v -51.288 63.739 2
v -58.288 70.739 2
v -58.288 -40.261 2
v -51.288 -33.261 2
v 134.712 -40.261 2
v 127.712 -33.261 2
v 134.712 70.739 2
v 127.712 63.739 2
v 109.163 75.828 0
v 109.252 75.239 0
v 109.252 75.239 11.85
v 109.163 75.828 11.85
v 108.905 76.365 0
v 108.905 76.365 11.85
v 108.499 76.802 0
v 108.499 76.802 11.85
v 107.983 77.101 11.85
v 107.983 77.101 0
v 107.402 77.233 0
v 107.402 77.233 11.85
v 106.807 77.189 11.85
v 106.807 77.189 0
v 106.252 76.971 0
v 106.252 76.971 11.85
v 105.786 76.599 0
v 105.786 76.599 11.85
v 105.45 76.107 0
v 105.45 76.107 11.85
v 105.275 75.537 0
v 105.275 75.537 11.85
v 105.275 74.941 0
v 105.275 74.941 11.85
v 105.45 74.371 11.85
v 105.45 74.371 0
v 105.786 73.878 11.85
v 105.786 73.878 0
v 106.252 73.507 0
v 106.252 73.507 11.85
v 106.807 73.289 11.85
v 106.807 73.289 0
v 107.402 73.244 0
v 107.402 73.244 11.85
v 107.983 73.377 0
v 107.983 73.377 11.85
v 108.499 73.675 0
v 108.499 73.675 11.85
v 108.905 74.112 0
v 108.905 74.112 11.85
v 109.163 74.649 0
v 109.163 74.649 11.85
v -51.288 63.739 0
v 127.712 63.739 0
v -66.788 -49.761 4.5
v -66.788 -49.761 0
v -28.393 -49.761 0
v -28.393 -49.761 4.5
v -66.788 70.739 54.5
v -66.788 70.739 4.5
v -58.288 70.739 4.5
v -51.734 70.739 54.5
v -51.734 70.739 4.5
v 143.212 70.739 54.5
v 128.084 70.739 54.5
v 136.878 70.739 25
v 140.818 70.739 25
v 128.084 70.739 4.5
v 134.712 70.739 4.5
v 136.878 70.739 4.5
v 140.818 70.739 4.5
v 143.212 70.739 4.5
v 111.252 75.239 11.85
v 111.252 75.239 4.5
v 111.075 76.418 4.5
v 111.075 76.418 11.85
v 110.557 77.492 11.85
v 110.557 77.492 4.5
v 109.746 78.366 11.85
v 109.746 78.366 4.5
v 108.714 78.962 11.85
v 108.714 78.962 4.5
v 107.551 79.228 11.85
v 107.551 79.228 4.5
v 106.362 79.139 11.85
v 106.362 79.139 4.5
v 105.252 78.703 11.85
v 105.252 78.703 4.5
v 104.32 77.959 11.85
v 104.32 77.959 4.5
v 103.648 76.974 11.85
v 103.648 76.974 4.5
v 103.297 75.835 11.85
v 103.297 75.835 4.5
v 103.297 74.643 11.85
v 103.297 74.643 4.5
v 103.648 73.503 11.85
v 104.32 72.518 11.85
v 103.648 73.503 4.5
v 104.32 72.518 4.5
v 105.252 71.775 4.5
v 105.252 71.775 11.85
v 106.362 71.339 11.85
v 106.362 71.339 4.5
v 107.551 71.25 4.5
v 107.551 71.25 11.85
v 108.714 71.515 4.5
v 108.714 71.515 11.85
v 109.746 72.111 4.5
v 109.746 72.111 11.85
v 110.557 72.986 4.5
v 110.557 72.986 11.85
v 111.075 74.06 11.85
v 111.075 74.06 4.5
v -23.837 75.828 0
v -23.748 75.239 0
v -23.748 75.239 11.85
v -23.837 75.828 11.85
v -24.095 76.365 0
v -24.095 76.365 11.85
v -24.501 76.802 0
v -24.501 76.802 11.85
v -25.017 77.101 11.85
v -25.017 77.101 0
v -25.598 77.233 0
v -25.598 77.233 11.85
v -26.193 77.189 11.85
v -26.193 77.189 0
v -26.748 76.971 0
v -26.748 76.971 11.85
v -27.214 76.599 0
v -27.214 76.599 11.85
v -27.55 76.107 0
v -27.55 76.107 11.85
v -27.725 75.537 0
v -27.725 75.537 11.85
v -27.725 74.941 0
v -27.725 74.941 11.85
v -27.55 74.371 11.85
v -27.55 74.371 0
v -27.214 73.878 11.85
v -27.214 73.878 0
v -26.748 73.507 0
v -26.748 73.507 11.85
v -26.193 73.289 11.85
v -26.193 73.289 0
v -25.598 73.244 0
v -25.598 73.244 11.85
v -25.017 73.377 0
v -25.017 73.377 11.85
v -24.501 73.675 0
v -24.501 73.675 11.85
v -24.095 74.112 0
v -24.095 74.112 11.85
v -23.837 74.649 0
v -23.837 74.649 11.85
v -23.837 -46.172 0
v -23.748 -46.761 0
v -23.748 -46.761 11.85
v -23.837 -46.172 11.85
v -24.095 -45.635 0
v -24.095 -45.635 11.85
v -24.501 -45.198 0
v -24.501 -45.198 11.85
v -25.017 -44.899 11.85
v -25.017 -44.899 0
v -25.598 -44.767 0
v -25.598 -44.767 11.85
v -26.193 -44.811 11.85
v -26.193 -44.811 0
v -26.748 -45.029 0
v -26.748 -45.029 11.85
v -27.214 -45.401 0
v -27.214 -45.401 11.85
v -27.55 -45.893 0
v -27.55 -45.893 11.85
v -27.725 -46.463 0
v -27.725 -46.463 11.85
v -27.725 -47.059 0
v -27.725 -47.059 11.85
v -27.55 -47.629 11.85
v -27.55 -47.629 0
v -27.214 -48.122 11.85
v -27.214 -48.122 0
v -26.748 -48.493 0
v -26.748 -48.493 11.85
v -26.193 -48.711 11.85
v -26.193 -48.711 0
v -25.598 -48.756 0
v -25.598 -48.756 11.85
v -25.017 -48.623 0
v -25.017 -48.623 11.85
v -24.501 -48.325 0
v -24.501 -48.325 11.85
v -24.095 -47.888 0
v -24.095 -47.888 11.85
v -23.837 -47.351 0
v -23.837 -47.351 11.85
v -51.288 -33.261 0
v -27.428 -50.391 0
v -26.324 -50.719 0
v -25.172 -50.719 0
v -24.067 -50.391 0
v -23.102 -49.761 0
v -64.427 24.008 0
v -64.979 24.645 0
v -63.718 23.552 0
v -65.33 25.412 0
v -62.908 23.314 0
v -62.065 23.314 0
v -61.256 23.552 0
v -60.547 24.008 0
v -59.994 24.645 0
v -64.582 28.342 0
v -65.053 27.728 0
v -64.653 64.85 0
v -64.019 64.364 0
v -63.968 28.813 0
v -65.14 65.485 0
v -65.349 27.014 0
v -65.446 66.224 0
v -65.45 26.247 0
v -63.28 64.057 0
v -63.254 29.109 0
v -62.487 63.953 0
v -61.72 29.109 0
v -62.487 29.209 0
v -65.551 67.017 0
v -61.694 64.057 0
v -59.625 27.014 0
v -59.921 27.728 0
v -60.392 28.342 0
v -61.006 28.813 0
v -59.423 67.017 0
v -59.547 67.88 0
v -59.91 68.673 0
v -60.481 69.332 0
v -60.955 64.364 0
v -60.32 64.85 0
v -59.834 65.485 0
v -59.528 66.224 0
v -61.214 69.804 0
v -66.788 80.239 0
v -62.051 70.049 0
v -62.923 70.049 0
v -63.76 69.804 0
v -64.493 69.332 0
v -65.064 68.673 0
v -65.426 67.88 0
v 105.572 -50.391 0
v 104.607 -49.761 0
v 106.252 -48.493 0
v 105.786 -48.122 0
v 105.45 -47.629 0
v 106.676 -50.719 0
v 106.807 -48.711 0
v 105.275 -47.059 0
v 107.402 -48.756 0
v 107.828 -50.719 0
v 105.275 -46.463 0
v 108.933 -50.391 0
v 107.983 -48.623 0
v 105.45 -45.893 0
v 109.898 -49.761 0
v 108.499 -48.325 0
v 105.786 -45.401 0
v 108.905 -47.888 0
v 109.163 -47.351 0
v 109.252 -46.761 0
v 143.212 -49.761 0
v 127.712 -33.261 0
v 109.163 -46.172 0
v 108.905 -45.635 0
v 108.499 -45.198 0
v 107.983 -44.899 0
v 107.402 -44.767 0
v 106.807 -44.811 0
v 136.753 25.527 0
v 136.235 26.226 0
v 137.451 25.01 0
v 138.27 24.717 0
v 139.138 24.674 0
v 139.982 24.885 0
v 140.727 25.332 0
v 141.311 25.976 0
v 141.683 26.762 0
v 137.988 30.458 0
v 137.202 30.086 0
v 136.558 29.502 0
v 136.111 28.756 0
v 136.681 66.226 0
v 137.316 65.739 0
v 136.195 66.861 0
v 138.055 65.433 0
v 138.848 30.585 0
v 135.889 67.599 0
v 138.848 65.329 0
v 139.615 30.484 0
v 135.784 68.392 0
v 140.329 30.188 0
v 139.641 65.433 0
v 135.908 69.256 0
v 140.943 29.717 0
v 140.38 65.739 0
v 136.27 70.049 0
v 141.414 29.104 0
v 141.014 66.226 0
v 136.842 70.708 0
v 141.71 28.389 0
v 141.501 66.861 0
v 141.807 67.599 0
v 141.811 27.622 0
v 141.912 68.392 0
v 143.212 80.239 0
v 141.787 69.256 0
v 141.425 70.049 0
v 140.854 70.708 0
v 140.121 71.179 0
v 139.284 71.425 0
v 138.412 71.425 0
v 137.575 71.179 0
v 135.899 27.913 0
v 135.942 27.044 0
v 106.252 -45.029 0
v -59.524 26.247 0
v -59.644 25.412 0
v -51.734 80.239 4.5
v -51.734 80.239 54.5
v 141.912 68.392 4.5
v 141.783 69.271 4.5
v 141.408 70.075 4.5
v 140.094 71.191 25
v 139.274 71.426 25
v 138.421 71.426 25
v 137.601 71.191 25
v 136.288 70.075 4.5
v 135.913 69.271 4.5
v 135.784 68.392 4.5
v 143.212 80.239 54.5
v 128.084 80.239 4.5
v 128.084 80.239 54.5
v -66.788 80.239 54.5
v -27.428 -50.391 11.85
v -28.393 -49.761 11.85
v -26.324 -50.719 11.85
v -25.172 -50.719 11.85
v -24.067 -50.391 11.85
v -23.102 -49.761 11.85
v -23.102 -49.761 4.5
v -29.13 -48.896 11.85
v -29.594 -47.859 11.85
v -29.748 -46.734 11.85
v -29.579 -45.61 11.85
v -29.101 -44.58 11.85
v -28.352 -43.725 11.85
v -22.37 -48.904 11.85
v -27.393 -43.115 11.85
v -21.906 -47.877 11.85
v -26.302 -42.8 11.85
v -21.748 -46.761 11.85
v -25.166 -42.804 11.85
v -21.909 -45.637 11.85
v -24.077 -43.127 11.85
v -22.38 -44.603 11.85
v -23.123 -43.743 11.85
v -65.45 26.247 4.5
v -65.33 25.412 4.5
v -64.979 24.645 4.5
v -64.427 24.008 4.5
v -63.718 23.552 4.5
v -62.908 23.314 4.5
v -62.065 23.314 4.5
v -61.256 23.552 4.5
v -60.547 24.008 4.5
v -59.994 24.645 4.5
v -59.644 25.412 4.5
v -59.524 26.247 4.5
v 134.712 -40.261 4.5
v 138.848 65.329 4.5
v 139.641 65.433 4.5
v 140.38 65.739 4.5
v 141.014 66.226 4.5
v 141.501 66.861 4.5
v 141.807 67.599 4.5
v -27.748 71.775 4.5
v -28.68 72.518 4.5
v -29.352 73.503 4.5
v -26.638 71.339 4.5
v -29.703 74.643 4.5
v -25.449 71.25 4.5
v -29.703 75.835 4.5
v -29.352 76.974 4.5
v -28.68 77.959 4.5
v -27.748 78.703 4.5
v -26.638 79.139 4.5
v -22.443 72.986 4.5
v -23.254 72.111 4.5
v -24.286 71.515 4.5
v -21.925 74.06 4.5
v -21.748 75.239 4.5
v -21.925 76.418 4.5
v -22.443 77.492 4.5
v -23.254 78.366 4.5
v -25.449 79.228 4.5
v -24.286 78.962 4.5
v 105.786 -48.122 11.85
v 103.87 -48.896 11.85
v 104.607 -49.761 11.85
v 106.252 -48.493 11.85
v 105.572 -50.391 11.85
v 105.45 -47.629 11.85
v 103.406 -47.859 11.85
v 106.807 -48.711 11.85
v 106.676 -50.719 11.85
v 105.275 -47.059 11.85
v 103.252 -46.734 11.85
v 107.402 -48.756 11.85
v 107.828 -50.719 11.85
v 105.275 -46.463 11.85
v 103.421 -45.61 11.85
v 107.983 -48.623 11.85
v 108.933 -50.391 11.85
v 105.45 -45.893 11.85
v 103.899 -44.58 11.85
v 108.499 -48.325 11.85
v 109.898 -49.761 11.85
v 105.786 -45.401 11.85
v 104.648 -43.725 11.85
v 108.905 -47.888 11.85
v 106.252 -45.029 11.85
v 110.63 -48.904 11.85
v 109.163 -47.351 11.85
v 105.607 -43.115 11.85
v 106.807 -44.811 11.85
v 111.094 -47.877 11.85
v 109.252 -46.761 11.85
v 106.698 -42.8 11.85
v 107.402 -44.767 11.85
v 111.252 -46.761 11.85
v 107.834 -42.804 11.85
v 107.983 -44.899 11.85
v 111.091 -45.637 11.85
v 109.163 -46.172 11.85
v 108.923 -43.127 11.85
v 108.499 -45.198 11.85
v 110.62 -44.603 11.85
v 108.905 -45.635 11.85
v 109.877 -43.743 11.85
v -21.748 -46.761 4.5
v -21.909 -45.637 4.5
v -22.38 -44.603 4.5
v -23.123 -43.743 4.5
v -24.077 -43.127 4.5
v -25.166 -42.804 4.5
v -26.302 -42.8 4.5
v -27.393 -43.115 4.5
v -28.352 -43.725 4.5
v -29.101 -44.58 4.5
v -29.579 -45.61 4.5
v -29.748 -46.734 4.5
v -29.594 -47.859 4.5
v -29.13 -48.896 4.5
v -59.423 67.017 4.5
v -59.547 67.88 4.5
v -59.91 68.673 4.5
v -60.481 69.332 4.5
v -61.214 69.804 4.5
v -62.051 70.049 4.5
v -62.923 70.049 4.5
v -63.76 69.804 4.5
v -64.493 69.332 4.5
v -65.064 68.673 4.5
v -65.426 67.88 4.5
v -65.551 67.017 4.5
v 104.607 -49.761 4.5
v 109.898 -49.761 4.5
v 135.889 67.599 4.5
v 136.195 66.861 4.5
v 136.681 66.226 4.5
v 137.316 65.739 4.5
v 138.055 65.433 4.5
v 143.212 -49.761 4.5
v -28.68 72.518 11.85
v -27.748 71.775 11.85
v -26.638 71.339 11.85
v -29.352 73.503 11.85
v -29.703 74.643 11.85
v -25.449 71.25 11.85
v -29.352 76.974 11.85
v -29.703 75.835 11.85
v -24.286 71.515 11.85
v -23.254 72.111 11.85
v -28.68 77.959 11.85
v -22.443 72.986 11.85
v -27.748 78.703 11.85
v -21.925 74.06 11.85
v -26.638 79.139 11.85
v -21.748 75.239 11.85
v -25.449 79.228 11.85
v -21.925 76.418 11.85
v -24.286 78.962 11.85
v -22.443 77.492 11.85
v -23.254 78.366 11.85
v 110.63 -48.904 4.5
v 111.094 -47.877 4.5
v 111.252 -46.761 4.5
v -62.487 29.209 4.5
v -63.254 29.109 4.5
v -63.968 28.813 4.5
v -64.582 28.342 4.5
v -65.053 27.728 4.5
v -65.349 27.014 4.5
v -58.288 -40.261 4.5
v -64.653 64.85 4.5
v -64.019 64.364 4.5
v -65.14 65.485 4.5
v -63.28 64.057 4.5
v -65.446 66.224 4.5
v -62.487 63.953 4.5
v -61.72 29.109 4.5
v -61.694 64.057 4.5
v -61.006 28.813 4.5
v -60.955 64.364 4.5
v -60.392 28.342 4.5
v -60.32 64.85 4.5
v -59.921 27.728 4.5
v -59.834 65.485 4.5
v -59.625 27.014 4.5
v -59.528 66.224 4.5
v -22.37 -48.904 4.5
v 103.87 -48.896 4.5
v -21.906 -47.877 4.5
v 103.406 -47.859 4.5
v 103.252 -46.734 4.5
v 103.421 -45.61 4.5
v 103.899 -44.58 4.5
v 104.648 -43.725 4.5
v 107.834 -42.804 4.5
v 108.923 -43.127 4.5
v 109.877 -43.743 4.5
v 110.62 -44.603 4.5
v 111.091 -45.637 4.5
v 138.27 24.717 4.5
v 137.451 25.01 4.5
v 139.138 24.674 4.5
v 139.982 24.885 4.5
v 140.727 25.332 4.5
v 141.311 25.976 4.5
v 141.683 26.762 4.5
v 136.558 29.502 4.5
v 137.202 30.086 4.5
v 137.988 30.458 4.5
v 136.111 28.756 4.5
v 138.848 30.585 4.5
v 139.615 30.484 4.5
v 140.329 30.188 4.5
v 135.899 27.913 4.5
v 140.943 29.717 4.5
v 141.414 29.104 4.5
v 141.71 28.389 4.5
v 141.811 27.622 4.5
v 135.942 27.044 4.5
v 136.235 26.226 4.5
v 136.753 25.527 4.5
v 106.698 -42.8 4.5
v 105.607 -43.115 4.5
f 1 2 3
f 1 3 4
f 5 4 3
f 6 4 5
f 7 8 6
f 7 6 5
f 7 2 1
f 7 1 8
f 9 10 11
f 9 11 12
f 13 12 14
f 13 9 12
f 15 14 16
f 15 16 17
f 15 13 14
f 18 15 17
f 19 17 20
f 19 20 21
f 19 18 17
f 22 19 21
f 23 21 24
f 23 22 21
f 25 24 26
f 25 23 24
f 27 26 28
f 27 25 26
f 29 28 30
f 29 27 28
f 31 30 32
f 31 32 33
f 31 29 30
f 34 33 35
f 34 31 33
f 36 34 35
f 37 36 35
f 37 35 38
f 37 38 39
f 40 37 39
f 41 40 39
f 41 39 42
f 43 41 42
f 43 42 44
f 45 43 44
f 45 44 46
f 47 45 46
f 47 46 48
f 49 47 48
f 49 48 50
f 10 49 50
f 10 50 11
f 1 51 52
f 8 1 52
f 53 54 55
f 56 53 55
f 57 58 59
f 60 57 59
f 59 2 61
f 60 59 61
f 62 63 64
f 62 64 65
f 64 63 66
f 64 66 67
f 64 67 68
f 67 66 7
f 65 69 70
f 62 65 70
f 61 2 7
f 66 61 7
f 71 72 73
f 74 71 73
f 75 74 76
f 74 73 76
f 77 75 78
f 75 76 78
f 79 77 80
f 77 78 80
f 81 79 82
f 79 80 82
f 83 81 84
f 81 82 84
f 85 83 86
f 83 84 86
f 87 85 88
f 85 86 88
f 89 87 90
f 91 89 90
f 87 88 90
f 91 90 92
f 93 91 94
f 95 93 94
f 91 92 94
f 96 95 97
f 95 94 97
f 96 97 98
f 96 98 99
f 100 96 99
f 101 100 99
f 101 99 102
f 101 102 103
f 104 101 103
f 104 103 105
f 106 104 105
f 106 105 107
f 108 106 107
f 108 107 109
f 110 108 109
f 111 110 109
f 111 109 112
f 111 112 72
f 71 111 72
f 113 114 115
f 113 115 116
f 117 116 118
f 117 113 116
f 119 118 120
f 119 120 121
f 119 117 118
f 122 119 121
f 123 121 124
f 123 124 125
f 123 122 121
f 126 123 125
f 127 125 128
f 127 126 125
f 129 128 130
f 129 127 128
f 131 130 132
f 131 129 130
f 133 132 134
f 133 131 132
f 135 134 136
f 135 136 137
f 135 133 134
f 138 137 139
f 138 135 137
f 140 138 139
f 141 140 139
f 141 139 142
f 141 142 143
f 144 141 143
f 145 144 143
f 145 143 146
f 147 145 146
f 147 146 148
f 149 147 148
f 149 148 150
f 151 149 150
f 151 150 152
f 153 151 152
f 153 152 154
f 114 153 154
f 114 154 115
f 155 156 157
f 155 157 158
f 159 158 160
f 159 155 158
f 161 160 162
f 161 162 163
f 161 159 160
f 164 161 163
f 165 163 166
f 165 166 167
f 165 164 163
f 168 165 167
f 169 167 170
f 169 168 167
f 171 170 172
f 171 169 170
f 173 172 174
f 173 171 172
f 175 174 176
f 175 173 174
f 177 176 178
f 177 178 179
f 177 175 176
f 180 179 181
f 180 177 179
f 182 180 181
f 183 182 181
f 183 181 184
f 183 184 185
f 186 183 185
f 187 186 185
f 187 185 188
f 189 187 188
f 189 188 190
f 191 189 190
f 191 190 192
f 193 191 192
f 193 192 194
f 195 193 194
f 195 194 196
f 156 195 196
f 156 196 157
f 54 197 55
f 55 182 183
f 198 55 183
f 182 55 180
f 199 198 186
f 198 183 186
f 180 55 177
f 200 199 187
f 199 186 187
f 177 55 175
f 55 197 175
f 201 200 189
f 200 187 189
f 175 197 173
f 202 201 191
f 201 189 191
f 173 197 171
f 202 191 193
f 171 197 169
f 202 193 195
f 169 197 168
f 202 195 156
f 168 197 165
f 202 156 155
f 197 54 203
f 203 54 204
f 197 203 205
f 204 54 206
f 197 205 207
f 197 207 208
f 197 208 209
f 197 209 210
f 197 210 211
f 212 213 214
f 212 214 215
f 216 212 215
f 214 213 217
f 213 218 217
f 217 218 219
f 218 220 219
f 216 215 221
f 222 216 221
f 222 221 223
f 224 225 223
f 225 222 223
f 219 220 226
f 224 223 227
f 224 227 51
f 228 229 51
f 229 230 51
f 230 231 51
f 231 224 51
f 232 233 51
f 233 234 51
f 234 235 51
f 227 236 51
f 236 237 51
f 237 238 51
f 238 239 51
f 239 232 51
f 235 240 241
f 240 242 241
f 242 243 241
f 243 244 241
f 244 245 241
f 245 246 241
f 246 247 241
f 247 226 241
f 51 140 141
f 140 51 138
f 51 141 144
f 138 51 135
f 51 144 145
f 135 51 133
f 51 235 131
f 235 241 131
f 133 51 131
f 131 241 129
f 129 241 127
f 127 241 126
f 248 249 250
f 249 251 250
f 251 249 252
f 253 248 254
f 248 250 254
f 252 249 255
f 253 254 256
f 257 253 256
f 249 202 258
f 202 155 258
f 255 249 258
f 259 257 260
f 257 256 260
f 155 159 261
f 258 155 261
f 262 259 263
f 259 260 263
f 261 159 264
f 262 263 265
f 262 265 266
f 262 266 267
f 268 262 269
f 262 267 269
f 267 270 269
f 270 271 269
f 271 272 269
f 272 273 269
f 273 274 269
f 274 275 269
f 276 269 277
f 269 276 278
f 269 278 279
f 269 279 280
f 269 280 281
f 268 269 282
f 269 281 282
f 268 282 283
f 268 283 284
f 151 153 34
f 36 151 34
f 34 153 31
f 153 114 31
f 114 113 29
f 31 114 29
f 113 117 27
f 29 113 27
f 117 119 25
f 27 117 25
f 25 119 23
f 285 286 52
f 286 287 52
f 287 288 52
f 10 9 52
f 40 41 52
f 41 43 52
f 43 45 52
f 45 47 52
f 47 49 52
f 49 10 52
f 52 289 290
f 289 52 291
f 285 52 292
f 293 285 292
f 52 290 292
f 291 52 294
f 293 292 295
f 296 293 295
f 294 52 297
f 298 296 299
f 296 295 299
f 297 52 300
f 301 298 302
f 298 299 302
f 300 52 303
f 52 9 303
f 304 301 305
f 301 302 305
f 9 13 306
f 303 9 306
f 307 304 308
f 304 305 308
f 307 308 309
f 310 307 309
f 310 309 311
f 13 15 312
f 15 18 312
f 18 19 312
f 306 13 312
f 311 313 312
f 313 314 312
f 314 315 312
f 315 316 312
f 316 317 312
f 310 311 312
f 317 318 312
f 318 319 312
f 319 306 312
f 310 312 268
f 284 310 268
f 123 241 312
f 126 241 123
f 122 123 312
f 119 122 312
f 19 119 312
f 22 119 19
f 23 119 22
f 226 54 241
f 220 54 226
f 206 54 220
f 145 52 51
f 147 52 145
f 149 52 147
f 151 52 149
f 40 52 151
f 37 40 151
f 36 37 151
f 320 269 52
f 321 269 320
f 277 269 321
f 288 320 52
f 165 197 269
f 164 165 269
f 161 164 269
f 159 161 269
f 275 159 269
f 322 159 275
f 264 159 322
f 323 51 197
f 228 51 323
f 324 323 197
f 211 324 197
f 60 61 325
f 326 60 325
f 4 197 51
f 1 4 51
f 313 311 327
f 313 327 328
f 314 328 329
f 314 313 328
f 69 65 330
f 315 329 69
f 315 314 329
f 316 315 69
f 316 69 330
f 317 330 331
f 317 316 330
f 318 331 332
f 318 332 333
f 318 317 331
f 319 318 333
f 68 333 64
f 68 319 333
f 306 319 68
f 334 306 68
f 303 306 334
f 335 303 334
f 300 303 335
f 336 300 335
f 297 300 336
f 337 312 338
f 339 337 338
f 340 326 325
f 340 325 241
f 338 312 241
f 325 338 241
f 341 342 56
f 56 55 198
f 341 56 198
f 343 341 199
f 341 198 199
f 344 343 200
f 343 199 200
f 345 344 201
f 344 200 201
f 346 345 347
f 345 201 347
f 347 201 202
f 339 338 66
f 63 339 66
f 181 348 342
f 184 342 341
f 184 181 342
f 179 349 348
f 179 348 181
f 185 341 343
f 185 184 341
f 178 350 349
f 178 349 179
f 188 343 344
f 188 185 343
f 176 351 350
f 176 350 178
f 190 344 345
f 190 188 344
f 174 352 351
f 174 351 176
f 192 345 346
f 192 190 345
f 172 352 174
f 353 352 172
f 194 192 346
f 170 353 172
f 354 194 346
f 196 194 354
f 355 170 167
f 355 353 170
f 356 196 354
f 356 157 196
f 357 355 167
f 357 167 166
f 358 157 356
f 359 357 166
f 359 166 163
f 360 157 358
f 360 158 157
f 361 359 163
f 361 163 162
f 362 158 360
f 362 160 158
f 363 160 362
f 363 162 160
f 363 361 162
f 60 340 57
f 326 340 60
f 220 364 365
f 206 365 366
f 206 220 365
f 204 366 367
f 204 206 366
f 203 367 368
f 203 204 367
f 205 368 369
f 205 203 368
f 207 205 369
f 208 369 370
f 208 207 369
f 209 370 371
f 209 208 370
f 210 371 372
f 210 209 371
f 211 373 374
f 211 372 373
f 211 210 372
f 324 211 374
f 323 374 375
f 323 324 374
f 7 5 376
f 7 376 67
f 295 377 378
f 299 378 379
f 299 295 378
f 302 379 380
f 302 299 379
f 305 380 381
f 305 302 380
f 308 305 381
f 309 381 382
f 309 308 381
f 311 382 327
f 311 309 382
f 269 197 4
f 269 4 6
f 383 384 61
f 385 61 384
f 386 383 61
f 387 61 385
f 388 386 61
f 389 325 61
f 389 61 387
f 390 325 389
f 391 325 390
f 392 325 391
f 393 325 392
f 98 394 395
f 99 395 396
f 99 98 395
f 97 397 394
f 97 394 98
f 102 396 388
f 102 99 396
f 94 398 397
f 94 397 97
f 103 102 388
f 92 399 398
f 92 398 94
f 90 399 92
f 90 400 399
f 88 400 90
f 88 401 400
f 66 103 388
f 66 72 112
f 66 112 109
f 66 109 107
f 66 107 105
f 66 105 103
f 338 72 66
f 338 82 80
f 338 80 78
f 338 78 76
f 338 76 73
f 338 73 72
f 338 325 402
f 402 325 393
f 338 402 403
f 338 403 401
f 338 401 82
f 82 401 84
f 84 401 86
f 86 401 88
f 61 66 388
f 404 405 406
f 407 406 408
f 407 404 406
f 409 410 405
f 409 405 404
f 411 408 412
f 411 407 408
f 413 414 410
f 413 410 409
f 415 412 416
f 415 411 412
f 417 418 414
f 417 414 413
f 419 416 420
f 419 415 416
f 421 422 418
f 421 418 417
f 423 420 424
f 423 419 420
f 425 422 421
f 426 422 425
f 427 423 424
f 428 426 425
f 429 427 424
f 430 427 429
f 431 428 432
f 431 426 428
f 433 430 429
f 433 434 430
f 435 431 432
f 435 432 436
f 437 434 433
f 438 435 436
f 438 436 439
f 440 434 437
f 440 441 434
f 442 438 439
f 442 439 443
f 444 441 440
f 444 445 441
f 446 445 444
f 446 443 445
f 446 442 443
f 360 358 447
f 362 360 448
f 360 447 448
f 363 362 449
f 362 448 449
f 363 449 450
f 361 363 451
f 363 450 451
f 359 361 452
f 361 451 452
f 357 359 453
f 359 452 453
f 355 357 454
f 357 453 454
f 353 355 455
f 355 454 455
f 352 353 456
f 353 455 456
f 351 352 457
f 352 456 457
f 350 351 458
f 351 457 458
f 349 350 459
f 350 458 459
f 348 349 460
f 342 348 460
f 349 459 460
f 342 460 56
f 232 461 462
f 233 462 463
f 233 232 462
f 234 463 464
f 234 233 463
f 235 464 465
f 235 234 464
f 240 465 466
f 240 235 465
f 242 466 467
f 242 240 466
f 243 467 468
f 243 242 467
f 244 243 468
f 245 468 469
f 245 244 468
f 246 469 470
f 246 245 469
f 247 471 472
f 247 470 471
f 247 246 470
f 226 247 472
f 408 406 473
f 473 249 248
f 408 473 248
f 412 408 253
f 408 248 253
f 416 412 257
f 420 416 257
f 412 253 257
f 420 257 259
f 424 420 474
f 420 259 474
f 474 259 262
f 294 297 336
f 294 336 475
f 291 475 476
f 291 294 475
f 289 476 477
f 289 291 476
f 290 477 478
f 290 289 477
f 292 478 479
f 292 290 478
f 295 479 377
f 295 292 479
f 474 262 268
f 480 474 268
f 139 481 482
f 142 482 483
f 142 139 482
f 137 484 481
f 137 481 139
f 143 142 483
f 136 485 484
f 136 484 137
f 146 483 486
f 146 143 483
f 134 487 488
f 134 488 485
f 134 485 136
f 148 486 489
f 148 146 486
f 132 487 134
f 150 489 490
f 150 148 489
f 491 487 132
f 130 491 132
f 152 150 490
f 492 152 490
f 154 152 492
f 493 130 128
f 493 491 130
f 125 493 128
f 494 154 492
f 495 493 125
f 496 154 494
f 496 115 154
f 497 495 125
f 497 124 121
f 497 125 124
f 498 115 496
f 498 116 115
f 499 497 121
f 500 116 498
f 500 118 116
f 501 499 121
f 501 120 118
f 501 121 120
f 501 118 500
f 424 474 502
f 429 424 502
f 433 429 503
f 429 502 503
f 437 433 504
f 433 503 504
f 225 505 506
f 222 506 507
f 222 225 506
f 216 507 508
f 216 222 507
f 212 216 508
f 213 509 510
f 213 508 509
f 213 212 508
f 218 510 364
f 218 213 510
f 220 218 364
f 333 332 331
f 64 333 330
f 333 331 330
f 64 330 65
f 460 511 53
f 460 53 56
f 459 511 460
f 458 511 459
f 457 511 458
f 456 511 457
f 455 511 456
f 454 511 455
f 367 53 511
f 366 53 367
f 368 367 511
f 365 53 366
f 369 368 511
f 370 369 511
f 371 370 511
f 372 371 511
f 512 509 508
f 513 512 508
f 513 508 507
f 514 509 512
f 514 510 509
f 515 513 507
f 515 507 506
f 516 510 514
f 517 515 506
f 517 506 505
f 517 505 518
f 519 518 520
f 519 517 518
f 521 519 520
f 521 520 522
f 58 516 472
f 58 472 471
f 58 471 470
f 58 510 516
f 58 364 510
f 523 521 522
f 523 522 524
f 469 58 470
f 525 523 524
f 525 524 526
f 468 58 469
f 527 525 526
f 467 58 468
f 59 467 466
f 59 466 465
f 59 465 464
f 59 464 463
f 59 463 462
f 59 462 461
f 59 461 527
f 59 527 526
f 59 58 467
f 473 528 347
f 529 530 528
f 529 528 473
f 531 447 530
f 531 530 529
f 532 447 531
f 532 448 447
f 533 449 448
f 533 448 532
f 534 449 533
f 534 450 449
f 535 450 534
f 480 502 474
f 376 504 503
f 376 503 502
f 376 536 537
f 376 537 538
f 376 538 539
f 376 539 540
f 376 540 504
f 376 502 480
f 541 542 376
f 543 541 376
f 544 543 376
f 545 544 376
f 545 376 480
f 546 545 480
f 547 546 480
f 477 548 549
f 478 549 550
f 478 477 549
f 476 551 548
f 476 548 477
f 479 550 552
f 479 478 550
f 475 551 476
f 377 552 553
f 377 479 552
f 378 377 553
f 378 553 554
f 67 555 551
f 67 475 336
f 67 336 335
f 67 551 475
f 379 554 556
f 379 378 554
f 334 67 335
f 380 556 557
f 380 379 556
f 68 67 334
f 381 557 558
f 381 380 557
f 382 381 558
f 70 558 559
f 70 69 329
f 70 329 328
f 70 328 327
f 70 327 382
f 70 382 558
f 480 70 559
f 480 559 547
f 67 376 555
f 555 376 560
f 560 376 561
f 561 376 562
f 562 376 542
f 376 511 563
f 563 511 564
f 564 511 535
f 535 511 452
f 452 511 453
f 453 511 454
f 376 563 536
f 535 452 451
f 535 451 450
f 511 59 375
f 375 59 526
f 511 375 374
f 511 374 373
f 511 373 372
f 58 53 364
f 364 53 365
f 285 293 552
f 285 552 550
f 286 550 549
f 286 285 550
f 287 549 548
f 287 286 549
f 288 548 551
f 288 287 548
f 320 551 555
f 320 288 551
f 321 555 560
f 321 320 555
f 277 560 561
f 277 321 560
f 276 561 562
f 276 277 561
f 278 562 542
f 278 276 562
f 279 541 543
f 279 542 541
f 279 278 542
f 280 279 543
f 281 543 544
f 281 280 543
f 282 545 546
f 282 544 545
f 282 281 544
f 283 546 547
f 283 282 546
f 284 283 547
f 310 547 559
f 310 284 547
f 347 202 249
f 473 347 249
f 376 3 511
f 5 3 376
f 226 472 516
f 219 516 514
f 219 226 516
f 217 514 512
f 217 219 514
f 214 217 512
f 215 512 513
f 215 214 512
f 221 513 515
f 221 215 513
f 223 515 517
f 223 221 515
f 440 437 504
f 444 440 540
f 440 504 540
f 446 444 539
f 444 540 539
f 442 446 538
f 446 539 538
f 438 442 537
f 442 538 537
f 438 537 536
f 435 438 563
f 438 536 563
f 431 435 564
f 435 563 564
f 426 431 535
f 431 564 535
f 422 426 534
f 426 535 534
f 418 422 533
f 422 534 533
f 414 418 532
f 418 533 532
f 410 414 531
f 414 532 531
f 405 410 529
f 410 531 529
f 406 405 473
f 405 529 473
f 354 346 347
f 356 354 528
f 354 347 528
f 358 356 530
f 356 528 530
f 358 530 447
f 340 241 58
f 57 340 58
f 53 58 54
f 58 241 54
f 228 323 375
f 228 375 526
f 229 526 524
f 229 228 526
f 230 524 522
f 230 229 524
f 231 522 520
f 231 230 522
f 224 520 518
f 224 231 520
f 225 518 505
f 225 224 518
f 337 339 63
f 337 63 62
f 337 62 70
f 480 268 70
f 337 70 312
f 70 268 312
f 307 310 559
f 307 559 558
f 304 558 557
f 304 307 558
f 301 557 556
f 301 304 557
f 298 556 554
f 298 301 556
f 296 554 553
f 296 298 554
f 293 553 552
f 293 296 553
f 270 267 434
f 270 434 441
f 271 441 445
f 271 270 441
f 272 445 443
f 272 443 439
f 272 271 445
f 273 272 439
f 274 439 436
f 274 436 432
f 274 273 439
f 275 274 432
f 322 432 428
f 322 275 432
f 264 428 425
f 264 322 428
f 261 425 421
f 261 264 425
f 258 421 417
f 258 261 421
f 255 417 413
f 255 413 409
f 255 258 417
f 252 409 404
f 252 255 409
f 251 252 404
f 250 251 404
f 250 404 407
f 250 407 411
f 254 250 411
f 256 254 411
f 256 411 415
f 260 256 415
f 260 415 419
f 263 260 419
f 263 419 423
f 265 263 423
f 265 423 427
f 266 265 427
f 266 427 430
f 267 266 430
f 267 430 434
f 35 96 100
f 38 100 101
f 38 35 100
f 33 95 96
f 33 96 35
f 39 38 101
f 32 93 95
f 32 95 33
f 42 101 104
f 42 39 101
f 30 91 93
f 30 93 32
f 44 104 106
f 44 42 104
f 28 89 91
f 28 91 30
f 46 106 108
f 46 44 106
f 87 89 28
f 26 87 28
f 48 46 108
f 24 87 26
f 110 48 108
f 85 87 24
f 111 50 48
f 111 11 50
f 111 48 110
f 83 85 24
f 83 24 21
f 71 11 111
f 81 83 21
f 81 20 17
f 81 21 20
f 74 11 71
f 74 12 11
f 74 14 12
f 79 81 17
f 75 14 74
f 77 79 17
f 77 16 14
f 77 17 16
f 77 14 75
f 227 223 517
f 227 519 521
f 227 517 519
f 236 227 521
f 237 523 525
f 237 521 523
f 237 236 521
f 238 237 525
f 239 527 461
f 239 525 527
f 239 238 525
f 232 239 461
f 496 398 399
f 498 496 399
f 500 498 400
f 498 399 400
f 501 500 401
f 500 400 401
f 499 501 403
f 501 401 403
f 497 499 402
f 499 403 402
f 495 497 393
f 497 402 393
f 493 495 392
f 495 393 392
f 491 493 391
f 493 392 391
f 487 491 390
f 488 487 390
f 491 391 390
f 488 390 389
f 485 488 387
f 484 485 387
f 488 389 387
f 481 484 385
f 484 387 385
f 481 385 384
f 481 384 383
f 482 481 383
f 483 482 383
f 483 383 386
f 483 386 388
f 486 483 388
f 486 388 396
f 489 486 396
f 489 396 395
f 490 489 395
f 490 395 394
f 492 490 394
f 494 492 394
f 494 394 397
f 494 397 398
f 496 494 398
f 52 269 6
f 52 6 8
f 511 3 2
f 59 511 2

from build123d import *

# Parameters (mm, degrees)
F0_W     = 193
F0_H     = 111
F0_W_2   = 179
F0_H_2   = 97
F1_DEPTH = 2
F0_R     = 4
F0_R_2   = 2
F2_DEPTH = 4.5
F3_DEPTH = 5
F4_DEPTH = 11.85
F6_DEPTH = 50
F9_DEPTH = 25


with BuildPart() as f1:
    # F0 (on Top) → F1 (new body)
    with BuildSketch(Plane.XY):
        with Locations((38.2122632861, 15.2387920618)):
            Rectangle(F0_W, F0_H)
        with Locations((38.2122632861, 15.2387920618)):
            Rectangle(F0_W_2, F0_H_2, mode=Mode.SUBTRACT)
    extrude(amount=F1_DEPTH)

    # F0 (on Top) → F2 (join)
    with BuildSketch(Plane.XY):
        with BuildLine():
            Line((143.2122632861, 80.2387920618), (-66.7877367139, 80.2387920618))
            Line((-66.7877367139, 80.2387920618), (-66.7877367139, -49.7612079382))
            Line((-66.7877367139, -49.7612079382), (-28.393488025, -49.7612079382))
            ThreePointArc((-28.393488025, -49.7612079382), (-27.393488025, -43.1154566271), (-21.7477367139, -46.7612079382))
            ThreePointArc((-21.7477367139, -46.7612079382), (-22.1019854028, -48.4069592493), (-23.1019854028, -49.7612079382))
            Line((-23.1019854028, -49.7612079382), (104.606511975, -49.7612079382))
            ThreePointArc((104.606511975, -49.7612079382), (105.606511975, -43.1154566271), (111.2522632861, -46.7612079382))
            ThreePointArc((111.2522632861, -46.7612079382), (110.8980145972, -48.4069592493), (109.8980145972, -49.7612079382))
            Line((109.8980145972, -49.7612079382), (143.2122632861, -49.7612079382))
            Line((143.2122632861, -49.7612079382), (143.2122632861, 80.2387920618))
        make_face()
        with Locations((38.2122632861, 15.2387920618)):
            Rectangle(F0_W, F0_H, mode=Mode.SUBTRACT)
        with Locations((-25.7477367139, 75.2387920618)):
            Circle(F0_R, mode=Mode.SUBTRACT)
        with Locations((107.2522632861, 75.2387920618)):
            Circle(F0_R, mode=Mode.SUBTRACT)
        with Locations((-25.7477367139, 75.2387920618)):
            Circle(F0_R)
        with Locations((-25.7477367139, 75.2387920618)):
            Circle(F0_R_2, mode=Mode.SUBTRACT)
        with Locations((107.2522632861, 75.2387920618)):
            Circle(F0_R)
        with Locations((107.2522632861, 75.2387920618)):
            Circle(F0_R_2, mode=Mode.SUBTRACT)
        with BuildLine():
            ThreePointArc((-21.7477367139, -46.7612079382), (-27.393488025, -43.1154566271), (-28.393488025, -49.7612079382))
            Line((-28.393488025, -49.7612079382), (-23.1019854028, -49.7612079382))
            ThreePointArc((-23.1019854028, -49.7612079382), (-22.1019854028, -48.4069592493), (-21.7477367139, -46.7612079382))
        make_face()
        with Locations((-25.7477367139, -46.7612079382)):
            Circle(F0_R_2, mode=Mode.SUBTRACT)
        with BuildLine():
            Line((104.606511975, -49.7612079382), (109.8980145972, -49.7612079382))
            ThreePointArc((109.8980145972, -49.7612079382), (110.8980145972, -48.4069592493), (111.2522632861, -46.7612079382))
            ThreePointArc((111.2522632861, -46.7612079382), (105.606511975, -43.1154566271), (104.606511975, -49.7612079382))
        make_face()
        with Locations((107.2522632861, -46.7612079382)):
            Circle(F0_R_2, mode=Mode.SUBTRACT)
    extrude(amount=F2_DEPTH)

    # F0 (on Top) → F3 (cut)
    with BuildSketch(Plane.XY):
        with Locations((-25.7477367139, 75.2387920618)):
            Circle(F0_R_2)
        with Locations((107.2522632861, 75.2387920618)):
            Circle(F0_R_2)
        with Locations((107.2522632861, -46.7612079382)):
            Circle(F0_R_2)
        with Locations((-25.7477367139, -46.7612079382)):
            Circle(F0_R_2)
    extrude(amount=-F3_DEPTH, mode=Mode.SUBTRACT)

    # F0 (on Top) → F4 (join)
    with BuildSketch(Plane.XY):
        with Locations((-25.7477367139, 75.2387920618)):
            Circle(F0_R)
        with Locations((-25.7477367139, 75.2387920618)):
            Circle(F0_R_2, mode=Mode.SUBTRACT)
        with BuildLine():
            Line((104.606511975, -49.7612079382), (109.8980145972, -49.7612079382))
            ThreePointArc((109.8980145972, -49.7612079382), (110.8980145972, -48.4069592493), (111.2522632861, -46.7612079382))
            ThreePointArc((111.2522632861, -46.7612079382), (105.606511975, -43.1154566271), (104.606511975, -49.7612079382))
        make_face()
        with Locations((107.2522632861, -46.7612079382)):
            Circle(F0_R_2, mode=Mode.SUBTRACT)
        with BuildLine():
            ThreePointArc((104.606511975, -49.7612079382), (107.2522632861, -50.7612079382), (109.8980145972, -49.7612079382))
            Line((109.8980145972, -49.7612079382), (104.606511975, -49.7612079382))
        make_face()
        with BuildLine():
            ThreePointArc((-21.7477367139, -46.7612079382), (-27.393488025, -43.1154566271), (-28.393488025, -49.7612079382))
            Line((-28.393488025, -49.7612079382), (-23.1019854028, -49.7612079382))
            ThreePointArc((-23.1019854028, -49.7612079382), (-22.1019854028, -48.4069592493), (-21.7477367139, -46.7612079382))
        make_face()
        with Locations((-25.7477367139, -46.7612079382)):
            Circle(F0_R_2, mode=Mode.SUBTRACT)
        with BuildLine():
            Line((-23.1019854028, -49.7612079382), (-28.393488025, -49.7612079382))
            ThreePointArc((-28.393488025, -49.7612079382), (-25.7477367139, -50.7612079382), (-23.1019854028, -49.7612079382))
        make_face()
        with Locations((107.2522632861, 75.2387920618)):
            Circle(F0_R)
        with Locations((107.2522632861, 75.2387920618)):
            Circle(F0_R_2, mode=Mode.SUBTRACT)
    extrude(amount=F4_DEPTH)

    # F5 (on face) → F6 (join)
    with BuildSketch(Plane.XY.offset(4.5)):
        Polygon((128.084346652, 80.2387920618), (128.084346652, 70.7387920618), (134.7122632861, 70.7387920618), (143.2122632861, 70.7387920618), (143.2122632861, 80.2387920618), align=None)
        Polygon((-66.7877367139, 70.7387920618), (-58.2877367139, 70.7387920618), (-51.7344288528, 70.7387920618), (-51.7344288528, 80.2387920618), (-66.7877367139, 80.2387920618), align=None)
    extrude(amount=F6_DEPTH)

    # F8 (on face) → F9 (cut)
    with BuildSketch(Plane.XY):
        with BuildLine():
            Line((135.7841315883, 68.3924248103), (138.8478337268, 68.3924248103))
            Line((138.8478337268, 68.3924248103), (141.9115358654, 68.3924248103))
            ThreePointArc((141.9115358654, 68.3924248103), (138.8478337268, 71.4561269488), (135.7841315883, 68.3924248103))
        make_face()
        with BuildLine():
            Line((138.8478337268, 65.3287226717), (138.8478337268, 68.3924248103))
            Line((138.8478337268, 68.3924248103), (135.7841315883, 68.3924248103))
            ThreePointArc((135.7841315883, 68.3924248103), (136.6814691691, 66.2260602526), (138.8478337268, 65.3287226717))
        make_face()
        with BuildLine():
            Line((141.9115358654, 68.3924248103), (138.8478337268, 68.3924248103))
            Line((138.8478337268, 68.3924248103), (138.8478337268, 65.3287226717))
            ThreePointArc((138.8478337268, 65.3287226717), (141.0141982845, 66.2260602526), (141.9115358654, 68.3924248103))
        make_face()
        with BuildLine():
            ThreePointArc((141.8105147335, 27.6224248103), (140.9427655571, 29.7173566406), (138.8478337268, 30.5851058169))
            Line((138.8478337268, 30.5851058169), (138.8478337268, 27.6224248103))
            Line((138.8478337268, 27.6224248103), (140.926355011, 27.6224248103))
            Line((140.926355011, 27.6224248103), (141.8105147335, 27.6224248103))
        make_face()
        with BuildLine():
            Line((138.8478337268, 27.6224248103), (138.8478337268, 30.5851058169))
            ThreePointArc((138.8478337268, 30.5851058169), (136.7529018965, 25.52749298), (141.8105147335, 27.6224248103))
            Line((141.8105147335, 27.6224248103), (140.926355011, 27.6224248103))
            Line((140.926355011, 27.6224248103), (138.8478337268, 27.6224248103))
        make_face()
        with BuildLine():
            Line((-65.5505631859, 67.0167887692), (-62.4868610473, 67.0167887692))
            Line((-62.4868610473, 67.0167887692), (-59.4231589088, 67.0167887692))
            ThreePointArc((-59.4231589088, 67.0167887692), (-62.4868610473, 70.0804909077), (-65.5505631859, 67.0167887692))
        make_face()
        with BuildLine():
            Line((-62.4868610473, 63.9530866306), (-62.4868610473, 67.0167887692))
            Line((-62.4868610473, 67.0167887692), (-65.5505631859, 67.0167887692))
            ThreePointArc((-65.5505631859, 67.0167887692), (-64.653225605, 64.8504242115), (-62.4868610473, 63.9530866306))
        make_face()
        with BuildLine():
            Line((-59.4231589088, 67.0167887692), (-62.4868610473, 67.0167887692))
            Line((-62.4868610473, 67.0167887692), (-62.4868610473, 63.9530866306))
            ThreePointArc((-62.4868610473, 63.9530866306), (-60.3204964896, 64.8504242115), (-59.4231589088, 67.0167887692))
        make_face()
        with BuildLine():
            ThreePointArc((-59.5241800407, 26.2467887692), (-60.391929217, 28.3417205994), (-62.4868610473, 29.2094697758))
            Line((-62.4868610473, 29.2094697758), (-62.4868610473, 26.2467887692))
            Line((-62.4868610473, 26.2467887692), (-59.5241800407, 26.2467887692))
        make_face()
        with BuildLine():
            Line((-62.4868610473, 26.2467887692), (-62.4868610473, 29.2094697758))
            ThreePointArc((-62.4868610473, 29.2094697758), (-64.5817928776, 28.3417205994), (-65.449542054, 26.2467887692))
            Line((-65.449542054, 26.2467887692), (-62.4868610473, 26.2467887692))
        make_face()
        with BuildLine():
            Line((-59.5241800407, 26.2467887692), (-62.4868610473, 26.2467887692))
            Line((-62.4868610473, 26.2467887692), (-65.449542054, 26.2467887692))
            ThreePointArc((-65.449542054, 26.2467887692), (-62.4868610473, 23.2841077625), (-59.5241800407, 26.2467887692))
        make_face()
    extrude(amount=F9_DEPTH, mode=Mode.SUBTRACT)


solid = f1.part
